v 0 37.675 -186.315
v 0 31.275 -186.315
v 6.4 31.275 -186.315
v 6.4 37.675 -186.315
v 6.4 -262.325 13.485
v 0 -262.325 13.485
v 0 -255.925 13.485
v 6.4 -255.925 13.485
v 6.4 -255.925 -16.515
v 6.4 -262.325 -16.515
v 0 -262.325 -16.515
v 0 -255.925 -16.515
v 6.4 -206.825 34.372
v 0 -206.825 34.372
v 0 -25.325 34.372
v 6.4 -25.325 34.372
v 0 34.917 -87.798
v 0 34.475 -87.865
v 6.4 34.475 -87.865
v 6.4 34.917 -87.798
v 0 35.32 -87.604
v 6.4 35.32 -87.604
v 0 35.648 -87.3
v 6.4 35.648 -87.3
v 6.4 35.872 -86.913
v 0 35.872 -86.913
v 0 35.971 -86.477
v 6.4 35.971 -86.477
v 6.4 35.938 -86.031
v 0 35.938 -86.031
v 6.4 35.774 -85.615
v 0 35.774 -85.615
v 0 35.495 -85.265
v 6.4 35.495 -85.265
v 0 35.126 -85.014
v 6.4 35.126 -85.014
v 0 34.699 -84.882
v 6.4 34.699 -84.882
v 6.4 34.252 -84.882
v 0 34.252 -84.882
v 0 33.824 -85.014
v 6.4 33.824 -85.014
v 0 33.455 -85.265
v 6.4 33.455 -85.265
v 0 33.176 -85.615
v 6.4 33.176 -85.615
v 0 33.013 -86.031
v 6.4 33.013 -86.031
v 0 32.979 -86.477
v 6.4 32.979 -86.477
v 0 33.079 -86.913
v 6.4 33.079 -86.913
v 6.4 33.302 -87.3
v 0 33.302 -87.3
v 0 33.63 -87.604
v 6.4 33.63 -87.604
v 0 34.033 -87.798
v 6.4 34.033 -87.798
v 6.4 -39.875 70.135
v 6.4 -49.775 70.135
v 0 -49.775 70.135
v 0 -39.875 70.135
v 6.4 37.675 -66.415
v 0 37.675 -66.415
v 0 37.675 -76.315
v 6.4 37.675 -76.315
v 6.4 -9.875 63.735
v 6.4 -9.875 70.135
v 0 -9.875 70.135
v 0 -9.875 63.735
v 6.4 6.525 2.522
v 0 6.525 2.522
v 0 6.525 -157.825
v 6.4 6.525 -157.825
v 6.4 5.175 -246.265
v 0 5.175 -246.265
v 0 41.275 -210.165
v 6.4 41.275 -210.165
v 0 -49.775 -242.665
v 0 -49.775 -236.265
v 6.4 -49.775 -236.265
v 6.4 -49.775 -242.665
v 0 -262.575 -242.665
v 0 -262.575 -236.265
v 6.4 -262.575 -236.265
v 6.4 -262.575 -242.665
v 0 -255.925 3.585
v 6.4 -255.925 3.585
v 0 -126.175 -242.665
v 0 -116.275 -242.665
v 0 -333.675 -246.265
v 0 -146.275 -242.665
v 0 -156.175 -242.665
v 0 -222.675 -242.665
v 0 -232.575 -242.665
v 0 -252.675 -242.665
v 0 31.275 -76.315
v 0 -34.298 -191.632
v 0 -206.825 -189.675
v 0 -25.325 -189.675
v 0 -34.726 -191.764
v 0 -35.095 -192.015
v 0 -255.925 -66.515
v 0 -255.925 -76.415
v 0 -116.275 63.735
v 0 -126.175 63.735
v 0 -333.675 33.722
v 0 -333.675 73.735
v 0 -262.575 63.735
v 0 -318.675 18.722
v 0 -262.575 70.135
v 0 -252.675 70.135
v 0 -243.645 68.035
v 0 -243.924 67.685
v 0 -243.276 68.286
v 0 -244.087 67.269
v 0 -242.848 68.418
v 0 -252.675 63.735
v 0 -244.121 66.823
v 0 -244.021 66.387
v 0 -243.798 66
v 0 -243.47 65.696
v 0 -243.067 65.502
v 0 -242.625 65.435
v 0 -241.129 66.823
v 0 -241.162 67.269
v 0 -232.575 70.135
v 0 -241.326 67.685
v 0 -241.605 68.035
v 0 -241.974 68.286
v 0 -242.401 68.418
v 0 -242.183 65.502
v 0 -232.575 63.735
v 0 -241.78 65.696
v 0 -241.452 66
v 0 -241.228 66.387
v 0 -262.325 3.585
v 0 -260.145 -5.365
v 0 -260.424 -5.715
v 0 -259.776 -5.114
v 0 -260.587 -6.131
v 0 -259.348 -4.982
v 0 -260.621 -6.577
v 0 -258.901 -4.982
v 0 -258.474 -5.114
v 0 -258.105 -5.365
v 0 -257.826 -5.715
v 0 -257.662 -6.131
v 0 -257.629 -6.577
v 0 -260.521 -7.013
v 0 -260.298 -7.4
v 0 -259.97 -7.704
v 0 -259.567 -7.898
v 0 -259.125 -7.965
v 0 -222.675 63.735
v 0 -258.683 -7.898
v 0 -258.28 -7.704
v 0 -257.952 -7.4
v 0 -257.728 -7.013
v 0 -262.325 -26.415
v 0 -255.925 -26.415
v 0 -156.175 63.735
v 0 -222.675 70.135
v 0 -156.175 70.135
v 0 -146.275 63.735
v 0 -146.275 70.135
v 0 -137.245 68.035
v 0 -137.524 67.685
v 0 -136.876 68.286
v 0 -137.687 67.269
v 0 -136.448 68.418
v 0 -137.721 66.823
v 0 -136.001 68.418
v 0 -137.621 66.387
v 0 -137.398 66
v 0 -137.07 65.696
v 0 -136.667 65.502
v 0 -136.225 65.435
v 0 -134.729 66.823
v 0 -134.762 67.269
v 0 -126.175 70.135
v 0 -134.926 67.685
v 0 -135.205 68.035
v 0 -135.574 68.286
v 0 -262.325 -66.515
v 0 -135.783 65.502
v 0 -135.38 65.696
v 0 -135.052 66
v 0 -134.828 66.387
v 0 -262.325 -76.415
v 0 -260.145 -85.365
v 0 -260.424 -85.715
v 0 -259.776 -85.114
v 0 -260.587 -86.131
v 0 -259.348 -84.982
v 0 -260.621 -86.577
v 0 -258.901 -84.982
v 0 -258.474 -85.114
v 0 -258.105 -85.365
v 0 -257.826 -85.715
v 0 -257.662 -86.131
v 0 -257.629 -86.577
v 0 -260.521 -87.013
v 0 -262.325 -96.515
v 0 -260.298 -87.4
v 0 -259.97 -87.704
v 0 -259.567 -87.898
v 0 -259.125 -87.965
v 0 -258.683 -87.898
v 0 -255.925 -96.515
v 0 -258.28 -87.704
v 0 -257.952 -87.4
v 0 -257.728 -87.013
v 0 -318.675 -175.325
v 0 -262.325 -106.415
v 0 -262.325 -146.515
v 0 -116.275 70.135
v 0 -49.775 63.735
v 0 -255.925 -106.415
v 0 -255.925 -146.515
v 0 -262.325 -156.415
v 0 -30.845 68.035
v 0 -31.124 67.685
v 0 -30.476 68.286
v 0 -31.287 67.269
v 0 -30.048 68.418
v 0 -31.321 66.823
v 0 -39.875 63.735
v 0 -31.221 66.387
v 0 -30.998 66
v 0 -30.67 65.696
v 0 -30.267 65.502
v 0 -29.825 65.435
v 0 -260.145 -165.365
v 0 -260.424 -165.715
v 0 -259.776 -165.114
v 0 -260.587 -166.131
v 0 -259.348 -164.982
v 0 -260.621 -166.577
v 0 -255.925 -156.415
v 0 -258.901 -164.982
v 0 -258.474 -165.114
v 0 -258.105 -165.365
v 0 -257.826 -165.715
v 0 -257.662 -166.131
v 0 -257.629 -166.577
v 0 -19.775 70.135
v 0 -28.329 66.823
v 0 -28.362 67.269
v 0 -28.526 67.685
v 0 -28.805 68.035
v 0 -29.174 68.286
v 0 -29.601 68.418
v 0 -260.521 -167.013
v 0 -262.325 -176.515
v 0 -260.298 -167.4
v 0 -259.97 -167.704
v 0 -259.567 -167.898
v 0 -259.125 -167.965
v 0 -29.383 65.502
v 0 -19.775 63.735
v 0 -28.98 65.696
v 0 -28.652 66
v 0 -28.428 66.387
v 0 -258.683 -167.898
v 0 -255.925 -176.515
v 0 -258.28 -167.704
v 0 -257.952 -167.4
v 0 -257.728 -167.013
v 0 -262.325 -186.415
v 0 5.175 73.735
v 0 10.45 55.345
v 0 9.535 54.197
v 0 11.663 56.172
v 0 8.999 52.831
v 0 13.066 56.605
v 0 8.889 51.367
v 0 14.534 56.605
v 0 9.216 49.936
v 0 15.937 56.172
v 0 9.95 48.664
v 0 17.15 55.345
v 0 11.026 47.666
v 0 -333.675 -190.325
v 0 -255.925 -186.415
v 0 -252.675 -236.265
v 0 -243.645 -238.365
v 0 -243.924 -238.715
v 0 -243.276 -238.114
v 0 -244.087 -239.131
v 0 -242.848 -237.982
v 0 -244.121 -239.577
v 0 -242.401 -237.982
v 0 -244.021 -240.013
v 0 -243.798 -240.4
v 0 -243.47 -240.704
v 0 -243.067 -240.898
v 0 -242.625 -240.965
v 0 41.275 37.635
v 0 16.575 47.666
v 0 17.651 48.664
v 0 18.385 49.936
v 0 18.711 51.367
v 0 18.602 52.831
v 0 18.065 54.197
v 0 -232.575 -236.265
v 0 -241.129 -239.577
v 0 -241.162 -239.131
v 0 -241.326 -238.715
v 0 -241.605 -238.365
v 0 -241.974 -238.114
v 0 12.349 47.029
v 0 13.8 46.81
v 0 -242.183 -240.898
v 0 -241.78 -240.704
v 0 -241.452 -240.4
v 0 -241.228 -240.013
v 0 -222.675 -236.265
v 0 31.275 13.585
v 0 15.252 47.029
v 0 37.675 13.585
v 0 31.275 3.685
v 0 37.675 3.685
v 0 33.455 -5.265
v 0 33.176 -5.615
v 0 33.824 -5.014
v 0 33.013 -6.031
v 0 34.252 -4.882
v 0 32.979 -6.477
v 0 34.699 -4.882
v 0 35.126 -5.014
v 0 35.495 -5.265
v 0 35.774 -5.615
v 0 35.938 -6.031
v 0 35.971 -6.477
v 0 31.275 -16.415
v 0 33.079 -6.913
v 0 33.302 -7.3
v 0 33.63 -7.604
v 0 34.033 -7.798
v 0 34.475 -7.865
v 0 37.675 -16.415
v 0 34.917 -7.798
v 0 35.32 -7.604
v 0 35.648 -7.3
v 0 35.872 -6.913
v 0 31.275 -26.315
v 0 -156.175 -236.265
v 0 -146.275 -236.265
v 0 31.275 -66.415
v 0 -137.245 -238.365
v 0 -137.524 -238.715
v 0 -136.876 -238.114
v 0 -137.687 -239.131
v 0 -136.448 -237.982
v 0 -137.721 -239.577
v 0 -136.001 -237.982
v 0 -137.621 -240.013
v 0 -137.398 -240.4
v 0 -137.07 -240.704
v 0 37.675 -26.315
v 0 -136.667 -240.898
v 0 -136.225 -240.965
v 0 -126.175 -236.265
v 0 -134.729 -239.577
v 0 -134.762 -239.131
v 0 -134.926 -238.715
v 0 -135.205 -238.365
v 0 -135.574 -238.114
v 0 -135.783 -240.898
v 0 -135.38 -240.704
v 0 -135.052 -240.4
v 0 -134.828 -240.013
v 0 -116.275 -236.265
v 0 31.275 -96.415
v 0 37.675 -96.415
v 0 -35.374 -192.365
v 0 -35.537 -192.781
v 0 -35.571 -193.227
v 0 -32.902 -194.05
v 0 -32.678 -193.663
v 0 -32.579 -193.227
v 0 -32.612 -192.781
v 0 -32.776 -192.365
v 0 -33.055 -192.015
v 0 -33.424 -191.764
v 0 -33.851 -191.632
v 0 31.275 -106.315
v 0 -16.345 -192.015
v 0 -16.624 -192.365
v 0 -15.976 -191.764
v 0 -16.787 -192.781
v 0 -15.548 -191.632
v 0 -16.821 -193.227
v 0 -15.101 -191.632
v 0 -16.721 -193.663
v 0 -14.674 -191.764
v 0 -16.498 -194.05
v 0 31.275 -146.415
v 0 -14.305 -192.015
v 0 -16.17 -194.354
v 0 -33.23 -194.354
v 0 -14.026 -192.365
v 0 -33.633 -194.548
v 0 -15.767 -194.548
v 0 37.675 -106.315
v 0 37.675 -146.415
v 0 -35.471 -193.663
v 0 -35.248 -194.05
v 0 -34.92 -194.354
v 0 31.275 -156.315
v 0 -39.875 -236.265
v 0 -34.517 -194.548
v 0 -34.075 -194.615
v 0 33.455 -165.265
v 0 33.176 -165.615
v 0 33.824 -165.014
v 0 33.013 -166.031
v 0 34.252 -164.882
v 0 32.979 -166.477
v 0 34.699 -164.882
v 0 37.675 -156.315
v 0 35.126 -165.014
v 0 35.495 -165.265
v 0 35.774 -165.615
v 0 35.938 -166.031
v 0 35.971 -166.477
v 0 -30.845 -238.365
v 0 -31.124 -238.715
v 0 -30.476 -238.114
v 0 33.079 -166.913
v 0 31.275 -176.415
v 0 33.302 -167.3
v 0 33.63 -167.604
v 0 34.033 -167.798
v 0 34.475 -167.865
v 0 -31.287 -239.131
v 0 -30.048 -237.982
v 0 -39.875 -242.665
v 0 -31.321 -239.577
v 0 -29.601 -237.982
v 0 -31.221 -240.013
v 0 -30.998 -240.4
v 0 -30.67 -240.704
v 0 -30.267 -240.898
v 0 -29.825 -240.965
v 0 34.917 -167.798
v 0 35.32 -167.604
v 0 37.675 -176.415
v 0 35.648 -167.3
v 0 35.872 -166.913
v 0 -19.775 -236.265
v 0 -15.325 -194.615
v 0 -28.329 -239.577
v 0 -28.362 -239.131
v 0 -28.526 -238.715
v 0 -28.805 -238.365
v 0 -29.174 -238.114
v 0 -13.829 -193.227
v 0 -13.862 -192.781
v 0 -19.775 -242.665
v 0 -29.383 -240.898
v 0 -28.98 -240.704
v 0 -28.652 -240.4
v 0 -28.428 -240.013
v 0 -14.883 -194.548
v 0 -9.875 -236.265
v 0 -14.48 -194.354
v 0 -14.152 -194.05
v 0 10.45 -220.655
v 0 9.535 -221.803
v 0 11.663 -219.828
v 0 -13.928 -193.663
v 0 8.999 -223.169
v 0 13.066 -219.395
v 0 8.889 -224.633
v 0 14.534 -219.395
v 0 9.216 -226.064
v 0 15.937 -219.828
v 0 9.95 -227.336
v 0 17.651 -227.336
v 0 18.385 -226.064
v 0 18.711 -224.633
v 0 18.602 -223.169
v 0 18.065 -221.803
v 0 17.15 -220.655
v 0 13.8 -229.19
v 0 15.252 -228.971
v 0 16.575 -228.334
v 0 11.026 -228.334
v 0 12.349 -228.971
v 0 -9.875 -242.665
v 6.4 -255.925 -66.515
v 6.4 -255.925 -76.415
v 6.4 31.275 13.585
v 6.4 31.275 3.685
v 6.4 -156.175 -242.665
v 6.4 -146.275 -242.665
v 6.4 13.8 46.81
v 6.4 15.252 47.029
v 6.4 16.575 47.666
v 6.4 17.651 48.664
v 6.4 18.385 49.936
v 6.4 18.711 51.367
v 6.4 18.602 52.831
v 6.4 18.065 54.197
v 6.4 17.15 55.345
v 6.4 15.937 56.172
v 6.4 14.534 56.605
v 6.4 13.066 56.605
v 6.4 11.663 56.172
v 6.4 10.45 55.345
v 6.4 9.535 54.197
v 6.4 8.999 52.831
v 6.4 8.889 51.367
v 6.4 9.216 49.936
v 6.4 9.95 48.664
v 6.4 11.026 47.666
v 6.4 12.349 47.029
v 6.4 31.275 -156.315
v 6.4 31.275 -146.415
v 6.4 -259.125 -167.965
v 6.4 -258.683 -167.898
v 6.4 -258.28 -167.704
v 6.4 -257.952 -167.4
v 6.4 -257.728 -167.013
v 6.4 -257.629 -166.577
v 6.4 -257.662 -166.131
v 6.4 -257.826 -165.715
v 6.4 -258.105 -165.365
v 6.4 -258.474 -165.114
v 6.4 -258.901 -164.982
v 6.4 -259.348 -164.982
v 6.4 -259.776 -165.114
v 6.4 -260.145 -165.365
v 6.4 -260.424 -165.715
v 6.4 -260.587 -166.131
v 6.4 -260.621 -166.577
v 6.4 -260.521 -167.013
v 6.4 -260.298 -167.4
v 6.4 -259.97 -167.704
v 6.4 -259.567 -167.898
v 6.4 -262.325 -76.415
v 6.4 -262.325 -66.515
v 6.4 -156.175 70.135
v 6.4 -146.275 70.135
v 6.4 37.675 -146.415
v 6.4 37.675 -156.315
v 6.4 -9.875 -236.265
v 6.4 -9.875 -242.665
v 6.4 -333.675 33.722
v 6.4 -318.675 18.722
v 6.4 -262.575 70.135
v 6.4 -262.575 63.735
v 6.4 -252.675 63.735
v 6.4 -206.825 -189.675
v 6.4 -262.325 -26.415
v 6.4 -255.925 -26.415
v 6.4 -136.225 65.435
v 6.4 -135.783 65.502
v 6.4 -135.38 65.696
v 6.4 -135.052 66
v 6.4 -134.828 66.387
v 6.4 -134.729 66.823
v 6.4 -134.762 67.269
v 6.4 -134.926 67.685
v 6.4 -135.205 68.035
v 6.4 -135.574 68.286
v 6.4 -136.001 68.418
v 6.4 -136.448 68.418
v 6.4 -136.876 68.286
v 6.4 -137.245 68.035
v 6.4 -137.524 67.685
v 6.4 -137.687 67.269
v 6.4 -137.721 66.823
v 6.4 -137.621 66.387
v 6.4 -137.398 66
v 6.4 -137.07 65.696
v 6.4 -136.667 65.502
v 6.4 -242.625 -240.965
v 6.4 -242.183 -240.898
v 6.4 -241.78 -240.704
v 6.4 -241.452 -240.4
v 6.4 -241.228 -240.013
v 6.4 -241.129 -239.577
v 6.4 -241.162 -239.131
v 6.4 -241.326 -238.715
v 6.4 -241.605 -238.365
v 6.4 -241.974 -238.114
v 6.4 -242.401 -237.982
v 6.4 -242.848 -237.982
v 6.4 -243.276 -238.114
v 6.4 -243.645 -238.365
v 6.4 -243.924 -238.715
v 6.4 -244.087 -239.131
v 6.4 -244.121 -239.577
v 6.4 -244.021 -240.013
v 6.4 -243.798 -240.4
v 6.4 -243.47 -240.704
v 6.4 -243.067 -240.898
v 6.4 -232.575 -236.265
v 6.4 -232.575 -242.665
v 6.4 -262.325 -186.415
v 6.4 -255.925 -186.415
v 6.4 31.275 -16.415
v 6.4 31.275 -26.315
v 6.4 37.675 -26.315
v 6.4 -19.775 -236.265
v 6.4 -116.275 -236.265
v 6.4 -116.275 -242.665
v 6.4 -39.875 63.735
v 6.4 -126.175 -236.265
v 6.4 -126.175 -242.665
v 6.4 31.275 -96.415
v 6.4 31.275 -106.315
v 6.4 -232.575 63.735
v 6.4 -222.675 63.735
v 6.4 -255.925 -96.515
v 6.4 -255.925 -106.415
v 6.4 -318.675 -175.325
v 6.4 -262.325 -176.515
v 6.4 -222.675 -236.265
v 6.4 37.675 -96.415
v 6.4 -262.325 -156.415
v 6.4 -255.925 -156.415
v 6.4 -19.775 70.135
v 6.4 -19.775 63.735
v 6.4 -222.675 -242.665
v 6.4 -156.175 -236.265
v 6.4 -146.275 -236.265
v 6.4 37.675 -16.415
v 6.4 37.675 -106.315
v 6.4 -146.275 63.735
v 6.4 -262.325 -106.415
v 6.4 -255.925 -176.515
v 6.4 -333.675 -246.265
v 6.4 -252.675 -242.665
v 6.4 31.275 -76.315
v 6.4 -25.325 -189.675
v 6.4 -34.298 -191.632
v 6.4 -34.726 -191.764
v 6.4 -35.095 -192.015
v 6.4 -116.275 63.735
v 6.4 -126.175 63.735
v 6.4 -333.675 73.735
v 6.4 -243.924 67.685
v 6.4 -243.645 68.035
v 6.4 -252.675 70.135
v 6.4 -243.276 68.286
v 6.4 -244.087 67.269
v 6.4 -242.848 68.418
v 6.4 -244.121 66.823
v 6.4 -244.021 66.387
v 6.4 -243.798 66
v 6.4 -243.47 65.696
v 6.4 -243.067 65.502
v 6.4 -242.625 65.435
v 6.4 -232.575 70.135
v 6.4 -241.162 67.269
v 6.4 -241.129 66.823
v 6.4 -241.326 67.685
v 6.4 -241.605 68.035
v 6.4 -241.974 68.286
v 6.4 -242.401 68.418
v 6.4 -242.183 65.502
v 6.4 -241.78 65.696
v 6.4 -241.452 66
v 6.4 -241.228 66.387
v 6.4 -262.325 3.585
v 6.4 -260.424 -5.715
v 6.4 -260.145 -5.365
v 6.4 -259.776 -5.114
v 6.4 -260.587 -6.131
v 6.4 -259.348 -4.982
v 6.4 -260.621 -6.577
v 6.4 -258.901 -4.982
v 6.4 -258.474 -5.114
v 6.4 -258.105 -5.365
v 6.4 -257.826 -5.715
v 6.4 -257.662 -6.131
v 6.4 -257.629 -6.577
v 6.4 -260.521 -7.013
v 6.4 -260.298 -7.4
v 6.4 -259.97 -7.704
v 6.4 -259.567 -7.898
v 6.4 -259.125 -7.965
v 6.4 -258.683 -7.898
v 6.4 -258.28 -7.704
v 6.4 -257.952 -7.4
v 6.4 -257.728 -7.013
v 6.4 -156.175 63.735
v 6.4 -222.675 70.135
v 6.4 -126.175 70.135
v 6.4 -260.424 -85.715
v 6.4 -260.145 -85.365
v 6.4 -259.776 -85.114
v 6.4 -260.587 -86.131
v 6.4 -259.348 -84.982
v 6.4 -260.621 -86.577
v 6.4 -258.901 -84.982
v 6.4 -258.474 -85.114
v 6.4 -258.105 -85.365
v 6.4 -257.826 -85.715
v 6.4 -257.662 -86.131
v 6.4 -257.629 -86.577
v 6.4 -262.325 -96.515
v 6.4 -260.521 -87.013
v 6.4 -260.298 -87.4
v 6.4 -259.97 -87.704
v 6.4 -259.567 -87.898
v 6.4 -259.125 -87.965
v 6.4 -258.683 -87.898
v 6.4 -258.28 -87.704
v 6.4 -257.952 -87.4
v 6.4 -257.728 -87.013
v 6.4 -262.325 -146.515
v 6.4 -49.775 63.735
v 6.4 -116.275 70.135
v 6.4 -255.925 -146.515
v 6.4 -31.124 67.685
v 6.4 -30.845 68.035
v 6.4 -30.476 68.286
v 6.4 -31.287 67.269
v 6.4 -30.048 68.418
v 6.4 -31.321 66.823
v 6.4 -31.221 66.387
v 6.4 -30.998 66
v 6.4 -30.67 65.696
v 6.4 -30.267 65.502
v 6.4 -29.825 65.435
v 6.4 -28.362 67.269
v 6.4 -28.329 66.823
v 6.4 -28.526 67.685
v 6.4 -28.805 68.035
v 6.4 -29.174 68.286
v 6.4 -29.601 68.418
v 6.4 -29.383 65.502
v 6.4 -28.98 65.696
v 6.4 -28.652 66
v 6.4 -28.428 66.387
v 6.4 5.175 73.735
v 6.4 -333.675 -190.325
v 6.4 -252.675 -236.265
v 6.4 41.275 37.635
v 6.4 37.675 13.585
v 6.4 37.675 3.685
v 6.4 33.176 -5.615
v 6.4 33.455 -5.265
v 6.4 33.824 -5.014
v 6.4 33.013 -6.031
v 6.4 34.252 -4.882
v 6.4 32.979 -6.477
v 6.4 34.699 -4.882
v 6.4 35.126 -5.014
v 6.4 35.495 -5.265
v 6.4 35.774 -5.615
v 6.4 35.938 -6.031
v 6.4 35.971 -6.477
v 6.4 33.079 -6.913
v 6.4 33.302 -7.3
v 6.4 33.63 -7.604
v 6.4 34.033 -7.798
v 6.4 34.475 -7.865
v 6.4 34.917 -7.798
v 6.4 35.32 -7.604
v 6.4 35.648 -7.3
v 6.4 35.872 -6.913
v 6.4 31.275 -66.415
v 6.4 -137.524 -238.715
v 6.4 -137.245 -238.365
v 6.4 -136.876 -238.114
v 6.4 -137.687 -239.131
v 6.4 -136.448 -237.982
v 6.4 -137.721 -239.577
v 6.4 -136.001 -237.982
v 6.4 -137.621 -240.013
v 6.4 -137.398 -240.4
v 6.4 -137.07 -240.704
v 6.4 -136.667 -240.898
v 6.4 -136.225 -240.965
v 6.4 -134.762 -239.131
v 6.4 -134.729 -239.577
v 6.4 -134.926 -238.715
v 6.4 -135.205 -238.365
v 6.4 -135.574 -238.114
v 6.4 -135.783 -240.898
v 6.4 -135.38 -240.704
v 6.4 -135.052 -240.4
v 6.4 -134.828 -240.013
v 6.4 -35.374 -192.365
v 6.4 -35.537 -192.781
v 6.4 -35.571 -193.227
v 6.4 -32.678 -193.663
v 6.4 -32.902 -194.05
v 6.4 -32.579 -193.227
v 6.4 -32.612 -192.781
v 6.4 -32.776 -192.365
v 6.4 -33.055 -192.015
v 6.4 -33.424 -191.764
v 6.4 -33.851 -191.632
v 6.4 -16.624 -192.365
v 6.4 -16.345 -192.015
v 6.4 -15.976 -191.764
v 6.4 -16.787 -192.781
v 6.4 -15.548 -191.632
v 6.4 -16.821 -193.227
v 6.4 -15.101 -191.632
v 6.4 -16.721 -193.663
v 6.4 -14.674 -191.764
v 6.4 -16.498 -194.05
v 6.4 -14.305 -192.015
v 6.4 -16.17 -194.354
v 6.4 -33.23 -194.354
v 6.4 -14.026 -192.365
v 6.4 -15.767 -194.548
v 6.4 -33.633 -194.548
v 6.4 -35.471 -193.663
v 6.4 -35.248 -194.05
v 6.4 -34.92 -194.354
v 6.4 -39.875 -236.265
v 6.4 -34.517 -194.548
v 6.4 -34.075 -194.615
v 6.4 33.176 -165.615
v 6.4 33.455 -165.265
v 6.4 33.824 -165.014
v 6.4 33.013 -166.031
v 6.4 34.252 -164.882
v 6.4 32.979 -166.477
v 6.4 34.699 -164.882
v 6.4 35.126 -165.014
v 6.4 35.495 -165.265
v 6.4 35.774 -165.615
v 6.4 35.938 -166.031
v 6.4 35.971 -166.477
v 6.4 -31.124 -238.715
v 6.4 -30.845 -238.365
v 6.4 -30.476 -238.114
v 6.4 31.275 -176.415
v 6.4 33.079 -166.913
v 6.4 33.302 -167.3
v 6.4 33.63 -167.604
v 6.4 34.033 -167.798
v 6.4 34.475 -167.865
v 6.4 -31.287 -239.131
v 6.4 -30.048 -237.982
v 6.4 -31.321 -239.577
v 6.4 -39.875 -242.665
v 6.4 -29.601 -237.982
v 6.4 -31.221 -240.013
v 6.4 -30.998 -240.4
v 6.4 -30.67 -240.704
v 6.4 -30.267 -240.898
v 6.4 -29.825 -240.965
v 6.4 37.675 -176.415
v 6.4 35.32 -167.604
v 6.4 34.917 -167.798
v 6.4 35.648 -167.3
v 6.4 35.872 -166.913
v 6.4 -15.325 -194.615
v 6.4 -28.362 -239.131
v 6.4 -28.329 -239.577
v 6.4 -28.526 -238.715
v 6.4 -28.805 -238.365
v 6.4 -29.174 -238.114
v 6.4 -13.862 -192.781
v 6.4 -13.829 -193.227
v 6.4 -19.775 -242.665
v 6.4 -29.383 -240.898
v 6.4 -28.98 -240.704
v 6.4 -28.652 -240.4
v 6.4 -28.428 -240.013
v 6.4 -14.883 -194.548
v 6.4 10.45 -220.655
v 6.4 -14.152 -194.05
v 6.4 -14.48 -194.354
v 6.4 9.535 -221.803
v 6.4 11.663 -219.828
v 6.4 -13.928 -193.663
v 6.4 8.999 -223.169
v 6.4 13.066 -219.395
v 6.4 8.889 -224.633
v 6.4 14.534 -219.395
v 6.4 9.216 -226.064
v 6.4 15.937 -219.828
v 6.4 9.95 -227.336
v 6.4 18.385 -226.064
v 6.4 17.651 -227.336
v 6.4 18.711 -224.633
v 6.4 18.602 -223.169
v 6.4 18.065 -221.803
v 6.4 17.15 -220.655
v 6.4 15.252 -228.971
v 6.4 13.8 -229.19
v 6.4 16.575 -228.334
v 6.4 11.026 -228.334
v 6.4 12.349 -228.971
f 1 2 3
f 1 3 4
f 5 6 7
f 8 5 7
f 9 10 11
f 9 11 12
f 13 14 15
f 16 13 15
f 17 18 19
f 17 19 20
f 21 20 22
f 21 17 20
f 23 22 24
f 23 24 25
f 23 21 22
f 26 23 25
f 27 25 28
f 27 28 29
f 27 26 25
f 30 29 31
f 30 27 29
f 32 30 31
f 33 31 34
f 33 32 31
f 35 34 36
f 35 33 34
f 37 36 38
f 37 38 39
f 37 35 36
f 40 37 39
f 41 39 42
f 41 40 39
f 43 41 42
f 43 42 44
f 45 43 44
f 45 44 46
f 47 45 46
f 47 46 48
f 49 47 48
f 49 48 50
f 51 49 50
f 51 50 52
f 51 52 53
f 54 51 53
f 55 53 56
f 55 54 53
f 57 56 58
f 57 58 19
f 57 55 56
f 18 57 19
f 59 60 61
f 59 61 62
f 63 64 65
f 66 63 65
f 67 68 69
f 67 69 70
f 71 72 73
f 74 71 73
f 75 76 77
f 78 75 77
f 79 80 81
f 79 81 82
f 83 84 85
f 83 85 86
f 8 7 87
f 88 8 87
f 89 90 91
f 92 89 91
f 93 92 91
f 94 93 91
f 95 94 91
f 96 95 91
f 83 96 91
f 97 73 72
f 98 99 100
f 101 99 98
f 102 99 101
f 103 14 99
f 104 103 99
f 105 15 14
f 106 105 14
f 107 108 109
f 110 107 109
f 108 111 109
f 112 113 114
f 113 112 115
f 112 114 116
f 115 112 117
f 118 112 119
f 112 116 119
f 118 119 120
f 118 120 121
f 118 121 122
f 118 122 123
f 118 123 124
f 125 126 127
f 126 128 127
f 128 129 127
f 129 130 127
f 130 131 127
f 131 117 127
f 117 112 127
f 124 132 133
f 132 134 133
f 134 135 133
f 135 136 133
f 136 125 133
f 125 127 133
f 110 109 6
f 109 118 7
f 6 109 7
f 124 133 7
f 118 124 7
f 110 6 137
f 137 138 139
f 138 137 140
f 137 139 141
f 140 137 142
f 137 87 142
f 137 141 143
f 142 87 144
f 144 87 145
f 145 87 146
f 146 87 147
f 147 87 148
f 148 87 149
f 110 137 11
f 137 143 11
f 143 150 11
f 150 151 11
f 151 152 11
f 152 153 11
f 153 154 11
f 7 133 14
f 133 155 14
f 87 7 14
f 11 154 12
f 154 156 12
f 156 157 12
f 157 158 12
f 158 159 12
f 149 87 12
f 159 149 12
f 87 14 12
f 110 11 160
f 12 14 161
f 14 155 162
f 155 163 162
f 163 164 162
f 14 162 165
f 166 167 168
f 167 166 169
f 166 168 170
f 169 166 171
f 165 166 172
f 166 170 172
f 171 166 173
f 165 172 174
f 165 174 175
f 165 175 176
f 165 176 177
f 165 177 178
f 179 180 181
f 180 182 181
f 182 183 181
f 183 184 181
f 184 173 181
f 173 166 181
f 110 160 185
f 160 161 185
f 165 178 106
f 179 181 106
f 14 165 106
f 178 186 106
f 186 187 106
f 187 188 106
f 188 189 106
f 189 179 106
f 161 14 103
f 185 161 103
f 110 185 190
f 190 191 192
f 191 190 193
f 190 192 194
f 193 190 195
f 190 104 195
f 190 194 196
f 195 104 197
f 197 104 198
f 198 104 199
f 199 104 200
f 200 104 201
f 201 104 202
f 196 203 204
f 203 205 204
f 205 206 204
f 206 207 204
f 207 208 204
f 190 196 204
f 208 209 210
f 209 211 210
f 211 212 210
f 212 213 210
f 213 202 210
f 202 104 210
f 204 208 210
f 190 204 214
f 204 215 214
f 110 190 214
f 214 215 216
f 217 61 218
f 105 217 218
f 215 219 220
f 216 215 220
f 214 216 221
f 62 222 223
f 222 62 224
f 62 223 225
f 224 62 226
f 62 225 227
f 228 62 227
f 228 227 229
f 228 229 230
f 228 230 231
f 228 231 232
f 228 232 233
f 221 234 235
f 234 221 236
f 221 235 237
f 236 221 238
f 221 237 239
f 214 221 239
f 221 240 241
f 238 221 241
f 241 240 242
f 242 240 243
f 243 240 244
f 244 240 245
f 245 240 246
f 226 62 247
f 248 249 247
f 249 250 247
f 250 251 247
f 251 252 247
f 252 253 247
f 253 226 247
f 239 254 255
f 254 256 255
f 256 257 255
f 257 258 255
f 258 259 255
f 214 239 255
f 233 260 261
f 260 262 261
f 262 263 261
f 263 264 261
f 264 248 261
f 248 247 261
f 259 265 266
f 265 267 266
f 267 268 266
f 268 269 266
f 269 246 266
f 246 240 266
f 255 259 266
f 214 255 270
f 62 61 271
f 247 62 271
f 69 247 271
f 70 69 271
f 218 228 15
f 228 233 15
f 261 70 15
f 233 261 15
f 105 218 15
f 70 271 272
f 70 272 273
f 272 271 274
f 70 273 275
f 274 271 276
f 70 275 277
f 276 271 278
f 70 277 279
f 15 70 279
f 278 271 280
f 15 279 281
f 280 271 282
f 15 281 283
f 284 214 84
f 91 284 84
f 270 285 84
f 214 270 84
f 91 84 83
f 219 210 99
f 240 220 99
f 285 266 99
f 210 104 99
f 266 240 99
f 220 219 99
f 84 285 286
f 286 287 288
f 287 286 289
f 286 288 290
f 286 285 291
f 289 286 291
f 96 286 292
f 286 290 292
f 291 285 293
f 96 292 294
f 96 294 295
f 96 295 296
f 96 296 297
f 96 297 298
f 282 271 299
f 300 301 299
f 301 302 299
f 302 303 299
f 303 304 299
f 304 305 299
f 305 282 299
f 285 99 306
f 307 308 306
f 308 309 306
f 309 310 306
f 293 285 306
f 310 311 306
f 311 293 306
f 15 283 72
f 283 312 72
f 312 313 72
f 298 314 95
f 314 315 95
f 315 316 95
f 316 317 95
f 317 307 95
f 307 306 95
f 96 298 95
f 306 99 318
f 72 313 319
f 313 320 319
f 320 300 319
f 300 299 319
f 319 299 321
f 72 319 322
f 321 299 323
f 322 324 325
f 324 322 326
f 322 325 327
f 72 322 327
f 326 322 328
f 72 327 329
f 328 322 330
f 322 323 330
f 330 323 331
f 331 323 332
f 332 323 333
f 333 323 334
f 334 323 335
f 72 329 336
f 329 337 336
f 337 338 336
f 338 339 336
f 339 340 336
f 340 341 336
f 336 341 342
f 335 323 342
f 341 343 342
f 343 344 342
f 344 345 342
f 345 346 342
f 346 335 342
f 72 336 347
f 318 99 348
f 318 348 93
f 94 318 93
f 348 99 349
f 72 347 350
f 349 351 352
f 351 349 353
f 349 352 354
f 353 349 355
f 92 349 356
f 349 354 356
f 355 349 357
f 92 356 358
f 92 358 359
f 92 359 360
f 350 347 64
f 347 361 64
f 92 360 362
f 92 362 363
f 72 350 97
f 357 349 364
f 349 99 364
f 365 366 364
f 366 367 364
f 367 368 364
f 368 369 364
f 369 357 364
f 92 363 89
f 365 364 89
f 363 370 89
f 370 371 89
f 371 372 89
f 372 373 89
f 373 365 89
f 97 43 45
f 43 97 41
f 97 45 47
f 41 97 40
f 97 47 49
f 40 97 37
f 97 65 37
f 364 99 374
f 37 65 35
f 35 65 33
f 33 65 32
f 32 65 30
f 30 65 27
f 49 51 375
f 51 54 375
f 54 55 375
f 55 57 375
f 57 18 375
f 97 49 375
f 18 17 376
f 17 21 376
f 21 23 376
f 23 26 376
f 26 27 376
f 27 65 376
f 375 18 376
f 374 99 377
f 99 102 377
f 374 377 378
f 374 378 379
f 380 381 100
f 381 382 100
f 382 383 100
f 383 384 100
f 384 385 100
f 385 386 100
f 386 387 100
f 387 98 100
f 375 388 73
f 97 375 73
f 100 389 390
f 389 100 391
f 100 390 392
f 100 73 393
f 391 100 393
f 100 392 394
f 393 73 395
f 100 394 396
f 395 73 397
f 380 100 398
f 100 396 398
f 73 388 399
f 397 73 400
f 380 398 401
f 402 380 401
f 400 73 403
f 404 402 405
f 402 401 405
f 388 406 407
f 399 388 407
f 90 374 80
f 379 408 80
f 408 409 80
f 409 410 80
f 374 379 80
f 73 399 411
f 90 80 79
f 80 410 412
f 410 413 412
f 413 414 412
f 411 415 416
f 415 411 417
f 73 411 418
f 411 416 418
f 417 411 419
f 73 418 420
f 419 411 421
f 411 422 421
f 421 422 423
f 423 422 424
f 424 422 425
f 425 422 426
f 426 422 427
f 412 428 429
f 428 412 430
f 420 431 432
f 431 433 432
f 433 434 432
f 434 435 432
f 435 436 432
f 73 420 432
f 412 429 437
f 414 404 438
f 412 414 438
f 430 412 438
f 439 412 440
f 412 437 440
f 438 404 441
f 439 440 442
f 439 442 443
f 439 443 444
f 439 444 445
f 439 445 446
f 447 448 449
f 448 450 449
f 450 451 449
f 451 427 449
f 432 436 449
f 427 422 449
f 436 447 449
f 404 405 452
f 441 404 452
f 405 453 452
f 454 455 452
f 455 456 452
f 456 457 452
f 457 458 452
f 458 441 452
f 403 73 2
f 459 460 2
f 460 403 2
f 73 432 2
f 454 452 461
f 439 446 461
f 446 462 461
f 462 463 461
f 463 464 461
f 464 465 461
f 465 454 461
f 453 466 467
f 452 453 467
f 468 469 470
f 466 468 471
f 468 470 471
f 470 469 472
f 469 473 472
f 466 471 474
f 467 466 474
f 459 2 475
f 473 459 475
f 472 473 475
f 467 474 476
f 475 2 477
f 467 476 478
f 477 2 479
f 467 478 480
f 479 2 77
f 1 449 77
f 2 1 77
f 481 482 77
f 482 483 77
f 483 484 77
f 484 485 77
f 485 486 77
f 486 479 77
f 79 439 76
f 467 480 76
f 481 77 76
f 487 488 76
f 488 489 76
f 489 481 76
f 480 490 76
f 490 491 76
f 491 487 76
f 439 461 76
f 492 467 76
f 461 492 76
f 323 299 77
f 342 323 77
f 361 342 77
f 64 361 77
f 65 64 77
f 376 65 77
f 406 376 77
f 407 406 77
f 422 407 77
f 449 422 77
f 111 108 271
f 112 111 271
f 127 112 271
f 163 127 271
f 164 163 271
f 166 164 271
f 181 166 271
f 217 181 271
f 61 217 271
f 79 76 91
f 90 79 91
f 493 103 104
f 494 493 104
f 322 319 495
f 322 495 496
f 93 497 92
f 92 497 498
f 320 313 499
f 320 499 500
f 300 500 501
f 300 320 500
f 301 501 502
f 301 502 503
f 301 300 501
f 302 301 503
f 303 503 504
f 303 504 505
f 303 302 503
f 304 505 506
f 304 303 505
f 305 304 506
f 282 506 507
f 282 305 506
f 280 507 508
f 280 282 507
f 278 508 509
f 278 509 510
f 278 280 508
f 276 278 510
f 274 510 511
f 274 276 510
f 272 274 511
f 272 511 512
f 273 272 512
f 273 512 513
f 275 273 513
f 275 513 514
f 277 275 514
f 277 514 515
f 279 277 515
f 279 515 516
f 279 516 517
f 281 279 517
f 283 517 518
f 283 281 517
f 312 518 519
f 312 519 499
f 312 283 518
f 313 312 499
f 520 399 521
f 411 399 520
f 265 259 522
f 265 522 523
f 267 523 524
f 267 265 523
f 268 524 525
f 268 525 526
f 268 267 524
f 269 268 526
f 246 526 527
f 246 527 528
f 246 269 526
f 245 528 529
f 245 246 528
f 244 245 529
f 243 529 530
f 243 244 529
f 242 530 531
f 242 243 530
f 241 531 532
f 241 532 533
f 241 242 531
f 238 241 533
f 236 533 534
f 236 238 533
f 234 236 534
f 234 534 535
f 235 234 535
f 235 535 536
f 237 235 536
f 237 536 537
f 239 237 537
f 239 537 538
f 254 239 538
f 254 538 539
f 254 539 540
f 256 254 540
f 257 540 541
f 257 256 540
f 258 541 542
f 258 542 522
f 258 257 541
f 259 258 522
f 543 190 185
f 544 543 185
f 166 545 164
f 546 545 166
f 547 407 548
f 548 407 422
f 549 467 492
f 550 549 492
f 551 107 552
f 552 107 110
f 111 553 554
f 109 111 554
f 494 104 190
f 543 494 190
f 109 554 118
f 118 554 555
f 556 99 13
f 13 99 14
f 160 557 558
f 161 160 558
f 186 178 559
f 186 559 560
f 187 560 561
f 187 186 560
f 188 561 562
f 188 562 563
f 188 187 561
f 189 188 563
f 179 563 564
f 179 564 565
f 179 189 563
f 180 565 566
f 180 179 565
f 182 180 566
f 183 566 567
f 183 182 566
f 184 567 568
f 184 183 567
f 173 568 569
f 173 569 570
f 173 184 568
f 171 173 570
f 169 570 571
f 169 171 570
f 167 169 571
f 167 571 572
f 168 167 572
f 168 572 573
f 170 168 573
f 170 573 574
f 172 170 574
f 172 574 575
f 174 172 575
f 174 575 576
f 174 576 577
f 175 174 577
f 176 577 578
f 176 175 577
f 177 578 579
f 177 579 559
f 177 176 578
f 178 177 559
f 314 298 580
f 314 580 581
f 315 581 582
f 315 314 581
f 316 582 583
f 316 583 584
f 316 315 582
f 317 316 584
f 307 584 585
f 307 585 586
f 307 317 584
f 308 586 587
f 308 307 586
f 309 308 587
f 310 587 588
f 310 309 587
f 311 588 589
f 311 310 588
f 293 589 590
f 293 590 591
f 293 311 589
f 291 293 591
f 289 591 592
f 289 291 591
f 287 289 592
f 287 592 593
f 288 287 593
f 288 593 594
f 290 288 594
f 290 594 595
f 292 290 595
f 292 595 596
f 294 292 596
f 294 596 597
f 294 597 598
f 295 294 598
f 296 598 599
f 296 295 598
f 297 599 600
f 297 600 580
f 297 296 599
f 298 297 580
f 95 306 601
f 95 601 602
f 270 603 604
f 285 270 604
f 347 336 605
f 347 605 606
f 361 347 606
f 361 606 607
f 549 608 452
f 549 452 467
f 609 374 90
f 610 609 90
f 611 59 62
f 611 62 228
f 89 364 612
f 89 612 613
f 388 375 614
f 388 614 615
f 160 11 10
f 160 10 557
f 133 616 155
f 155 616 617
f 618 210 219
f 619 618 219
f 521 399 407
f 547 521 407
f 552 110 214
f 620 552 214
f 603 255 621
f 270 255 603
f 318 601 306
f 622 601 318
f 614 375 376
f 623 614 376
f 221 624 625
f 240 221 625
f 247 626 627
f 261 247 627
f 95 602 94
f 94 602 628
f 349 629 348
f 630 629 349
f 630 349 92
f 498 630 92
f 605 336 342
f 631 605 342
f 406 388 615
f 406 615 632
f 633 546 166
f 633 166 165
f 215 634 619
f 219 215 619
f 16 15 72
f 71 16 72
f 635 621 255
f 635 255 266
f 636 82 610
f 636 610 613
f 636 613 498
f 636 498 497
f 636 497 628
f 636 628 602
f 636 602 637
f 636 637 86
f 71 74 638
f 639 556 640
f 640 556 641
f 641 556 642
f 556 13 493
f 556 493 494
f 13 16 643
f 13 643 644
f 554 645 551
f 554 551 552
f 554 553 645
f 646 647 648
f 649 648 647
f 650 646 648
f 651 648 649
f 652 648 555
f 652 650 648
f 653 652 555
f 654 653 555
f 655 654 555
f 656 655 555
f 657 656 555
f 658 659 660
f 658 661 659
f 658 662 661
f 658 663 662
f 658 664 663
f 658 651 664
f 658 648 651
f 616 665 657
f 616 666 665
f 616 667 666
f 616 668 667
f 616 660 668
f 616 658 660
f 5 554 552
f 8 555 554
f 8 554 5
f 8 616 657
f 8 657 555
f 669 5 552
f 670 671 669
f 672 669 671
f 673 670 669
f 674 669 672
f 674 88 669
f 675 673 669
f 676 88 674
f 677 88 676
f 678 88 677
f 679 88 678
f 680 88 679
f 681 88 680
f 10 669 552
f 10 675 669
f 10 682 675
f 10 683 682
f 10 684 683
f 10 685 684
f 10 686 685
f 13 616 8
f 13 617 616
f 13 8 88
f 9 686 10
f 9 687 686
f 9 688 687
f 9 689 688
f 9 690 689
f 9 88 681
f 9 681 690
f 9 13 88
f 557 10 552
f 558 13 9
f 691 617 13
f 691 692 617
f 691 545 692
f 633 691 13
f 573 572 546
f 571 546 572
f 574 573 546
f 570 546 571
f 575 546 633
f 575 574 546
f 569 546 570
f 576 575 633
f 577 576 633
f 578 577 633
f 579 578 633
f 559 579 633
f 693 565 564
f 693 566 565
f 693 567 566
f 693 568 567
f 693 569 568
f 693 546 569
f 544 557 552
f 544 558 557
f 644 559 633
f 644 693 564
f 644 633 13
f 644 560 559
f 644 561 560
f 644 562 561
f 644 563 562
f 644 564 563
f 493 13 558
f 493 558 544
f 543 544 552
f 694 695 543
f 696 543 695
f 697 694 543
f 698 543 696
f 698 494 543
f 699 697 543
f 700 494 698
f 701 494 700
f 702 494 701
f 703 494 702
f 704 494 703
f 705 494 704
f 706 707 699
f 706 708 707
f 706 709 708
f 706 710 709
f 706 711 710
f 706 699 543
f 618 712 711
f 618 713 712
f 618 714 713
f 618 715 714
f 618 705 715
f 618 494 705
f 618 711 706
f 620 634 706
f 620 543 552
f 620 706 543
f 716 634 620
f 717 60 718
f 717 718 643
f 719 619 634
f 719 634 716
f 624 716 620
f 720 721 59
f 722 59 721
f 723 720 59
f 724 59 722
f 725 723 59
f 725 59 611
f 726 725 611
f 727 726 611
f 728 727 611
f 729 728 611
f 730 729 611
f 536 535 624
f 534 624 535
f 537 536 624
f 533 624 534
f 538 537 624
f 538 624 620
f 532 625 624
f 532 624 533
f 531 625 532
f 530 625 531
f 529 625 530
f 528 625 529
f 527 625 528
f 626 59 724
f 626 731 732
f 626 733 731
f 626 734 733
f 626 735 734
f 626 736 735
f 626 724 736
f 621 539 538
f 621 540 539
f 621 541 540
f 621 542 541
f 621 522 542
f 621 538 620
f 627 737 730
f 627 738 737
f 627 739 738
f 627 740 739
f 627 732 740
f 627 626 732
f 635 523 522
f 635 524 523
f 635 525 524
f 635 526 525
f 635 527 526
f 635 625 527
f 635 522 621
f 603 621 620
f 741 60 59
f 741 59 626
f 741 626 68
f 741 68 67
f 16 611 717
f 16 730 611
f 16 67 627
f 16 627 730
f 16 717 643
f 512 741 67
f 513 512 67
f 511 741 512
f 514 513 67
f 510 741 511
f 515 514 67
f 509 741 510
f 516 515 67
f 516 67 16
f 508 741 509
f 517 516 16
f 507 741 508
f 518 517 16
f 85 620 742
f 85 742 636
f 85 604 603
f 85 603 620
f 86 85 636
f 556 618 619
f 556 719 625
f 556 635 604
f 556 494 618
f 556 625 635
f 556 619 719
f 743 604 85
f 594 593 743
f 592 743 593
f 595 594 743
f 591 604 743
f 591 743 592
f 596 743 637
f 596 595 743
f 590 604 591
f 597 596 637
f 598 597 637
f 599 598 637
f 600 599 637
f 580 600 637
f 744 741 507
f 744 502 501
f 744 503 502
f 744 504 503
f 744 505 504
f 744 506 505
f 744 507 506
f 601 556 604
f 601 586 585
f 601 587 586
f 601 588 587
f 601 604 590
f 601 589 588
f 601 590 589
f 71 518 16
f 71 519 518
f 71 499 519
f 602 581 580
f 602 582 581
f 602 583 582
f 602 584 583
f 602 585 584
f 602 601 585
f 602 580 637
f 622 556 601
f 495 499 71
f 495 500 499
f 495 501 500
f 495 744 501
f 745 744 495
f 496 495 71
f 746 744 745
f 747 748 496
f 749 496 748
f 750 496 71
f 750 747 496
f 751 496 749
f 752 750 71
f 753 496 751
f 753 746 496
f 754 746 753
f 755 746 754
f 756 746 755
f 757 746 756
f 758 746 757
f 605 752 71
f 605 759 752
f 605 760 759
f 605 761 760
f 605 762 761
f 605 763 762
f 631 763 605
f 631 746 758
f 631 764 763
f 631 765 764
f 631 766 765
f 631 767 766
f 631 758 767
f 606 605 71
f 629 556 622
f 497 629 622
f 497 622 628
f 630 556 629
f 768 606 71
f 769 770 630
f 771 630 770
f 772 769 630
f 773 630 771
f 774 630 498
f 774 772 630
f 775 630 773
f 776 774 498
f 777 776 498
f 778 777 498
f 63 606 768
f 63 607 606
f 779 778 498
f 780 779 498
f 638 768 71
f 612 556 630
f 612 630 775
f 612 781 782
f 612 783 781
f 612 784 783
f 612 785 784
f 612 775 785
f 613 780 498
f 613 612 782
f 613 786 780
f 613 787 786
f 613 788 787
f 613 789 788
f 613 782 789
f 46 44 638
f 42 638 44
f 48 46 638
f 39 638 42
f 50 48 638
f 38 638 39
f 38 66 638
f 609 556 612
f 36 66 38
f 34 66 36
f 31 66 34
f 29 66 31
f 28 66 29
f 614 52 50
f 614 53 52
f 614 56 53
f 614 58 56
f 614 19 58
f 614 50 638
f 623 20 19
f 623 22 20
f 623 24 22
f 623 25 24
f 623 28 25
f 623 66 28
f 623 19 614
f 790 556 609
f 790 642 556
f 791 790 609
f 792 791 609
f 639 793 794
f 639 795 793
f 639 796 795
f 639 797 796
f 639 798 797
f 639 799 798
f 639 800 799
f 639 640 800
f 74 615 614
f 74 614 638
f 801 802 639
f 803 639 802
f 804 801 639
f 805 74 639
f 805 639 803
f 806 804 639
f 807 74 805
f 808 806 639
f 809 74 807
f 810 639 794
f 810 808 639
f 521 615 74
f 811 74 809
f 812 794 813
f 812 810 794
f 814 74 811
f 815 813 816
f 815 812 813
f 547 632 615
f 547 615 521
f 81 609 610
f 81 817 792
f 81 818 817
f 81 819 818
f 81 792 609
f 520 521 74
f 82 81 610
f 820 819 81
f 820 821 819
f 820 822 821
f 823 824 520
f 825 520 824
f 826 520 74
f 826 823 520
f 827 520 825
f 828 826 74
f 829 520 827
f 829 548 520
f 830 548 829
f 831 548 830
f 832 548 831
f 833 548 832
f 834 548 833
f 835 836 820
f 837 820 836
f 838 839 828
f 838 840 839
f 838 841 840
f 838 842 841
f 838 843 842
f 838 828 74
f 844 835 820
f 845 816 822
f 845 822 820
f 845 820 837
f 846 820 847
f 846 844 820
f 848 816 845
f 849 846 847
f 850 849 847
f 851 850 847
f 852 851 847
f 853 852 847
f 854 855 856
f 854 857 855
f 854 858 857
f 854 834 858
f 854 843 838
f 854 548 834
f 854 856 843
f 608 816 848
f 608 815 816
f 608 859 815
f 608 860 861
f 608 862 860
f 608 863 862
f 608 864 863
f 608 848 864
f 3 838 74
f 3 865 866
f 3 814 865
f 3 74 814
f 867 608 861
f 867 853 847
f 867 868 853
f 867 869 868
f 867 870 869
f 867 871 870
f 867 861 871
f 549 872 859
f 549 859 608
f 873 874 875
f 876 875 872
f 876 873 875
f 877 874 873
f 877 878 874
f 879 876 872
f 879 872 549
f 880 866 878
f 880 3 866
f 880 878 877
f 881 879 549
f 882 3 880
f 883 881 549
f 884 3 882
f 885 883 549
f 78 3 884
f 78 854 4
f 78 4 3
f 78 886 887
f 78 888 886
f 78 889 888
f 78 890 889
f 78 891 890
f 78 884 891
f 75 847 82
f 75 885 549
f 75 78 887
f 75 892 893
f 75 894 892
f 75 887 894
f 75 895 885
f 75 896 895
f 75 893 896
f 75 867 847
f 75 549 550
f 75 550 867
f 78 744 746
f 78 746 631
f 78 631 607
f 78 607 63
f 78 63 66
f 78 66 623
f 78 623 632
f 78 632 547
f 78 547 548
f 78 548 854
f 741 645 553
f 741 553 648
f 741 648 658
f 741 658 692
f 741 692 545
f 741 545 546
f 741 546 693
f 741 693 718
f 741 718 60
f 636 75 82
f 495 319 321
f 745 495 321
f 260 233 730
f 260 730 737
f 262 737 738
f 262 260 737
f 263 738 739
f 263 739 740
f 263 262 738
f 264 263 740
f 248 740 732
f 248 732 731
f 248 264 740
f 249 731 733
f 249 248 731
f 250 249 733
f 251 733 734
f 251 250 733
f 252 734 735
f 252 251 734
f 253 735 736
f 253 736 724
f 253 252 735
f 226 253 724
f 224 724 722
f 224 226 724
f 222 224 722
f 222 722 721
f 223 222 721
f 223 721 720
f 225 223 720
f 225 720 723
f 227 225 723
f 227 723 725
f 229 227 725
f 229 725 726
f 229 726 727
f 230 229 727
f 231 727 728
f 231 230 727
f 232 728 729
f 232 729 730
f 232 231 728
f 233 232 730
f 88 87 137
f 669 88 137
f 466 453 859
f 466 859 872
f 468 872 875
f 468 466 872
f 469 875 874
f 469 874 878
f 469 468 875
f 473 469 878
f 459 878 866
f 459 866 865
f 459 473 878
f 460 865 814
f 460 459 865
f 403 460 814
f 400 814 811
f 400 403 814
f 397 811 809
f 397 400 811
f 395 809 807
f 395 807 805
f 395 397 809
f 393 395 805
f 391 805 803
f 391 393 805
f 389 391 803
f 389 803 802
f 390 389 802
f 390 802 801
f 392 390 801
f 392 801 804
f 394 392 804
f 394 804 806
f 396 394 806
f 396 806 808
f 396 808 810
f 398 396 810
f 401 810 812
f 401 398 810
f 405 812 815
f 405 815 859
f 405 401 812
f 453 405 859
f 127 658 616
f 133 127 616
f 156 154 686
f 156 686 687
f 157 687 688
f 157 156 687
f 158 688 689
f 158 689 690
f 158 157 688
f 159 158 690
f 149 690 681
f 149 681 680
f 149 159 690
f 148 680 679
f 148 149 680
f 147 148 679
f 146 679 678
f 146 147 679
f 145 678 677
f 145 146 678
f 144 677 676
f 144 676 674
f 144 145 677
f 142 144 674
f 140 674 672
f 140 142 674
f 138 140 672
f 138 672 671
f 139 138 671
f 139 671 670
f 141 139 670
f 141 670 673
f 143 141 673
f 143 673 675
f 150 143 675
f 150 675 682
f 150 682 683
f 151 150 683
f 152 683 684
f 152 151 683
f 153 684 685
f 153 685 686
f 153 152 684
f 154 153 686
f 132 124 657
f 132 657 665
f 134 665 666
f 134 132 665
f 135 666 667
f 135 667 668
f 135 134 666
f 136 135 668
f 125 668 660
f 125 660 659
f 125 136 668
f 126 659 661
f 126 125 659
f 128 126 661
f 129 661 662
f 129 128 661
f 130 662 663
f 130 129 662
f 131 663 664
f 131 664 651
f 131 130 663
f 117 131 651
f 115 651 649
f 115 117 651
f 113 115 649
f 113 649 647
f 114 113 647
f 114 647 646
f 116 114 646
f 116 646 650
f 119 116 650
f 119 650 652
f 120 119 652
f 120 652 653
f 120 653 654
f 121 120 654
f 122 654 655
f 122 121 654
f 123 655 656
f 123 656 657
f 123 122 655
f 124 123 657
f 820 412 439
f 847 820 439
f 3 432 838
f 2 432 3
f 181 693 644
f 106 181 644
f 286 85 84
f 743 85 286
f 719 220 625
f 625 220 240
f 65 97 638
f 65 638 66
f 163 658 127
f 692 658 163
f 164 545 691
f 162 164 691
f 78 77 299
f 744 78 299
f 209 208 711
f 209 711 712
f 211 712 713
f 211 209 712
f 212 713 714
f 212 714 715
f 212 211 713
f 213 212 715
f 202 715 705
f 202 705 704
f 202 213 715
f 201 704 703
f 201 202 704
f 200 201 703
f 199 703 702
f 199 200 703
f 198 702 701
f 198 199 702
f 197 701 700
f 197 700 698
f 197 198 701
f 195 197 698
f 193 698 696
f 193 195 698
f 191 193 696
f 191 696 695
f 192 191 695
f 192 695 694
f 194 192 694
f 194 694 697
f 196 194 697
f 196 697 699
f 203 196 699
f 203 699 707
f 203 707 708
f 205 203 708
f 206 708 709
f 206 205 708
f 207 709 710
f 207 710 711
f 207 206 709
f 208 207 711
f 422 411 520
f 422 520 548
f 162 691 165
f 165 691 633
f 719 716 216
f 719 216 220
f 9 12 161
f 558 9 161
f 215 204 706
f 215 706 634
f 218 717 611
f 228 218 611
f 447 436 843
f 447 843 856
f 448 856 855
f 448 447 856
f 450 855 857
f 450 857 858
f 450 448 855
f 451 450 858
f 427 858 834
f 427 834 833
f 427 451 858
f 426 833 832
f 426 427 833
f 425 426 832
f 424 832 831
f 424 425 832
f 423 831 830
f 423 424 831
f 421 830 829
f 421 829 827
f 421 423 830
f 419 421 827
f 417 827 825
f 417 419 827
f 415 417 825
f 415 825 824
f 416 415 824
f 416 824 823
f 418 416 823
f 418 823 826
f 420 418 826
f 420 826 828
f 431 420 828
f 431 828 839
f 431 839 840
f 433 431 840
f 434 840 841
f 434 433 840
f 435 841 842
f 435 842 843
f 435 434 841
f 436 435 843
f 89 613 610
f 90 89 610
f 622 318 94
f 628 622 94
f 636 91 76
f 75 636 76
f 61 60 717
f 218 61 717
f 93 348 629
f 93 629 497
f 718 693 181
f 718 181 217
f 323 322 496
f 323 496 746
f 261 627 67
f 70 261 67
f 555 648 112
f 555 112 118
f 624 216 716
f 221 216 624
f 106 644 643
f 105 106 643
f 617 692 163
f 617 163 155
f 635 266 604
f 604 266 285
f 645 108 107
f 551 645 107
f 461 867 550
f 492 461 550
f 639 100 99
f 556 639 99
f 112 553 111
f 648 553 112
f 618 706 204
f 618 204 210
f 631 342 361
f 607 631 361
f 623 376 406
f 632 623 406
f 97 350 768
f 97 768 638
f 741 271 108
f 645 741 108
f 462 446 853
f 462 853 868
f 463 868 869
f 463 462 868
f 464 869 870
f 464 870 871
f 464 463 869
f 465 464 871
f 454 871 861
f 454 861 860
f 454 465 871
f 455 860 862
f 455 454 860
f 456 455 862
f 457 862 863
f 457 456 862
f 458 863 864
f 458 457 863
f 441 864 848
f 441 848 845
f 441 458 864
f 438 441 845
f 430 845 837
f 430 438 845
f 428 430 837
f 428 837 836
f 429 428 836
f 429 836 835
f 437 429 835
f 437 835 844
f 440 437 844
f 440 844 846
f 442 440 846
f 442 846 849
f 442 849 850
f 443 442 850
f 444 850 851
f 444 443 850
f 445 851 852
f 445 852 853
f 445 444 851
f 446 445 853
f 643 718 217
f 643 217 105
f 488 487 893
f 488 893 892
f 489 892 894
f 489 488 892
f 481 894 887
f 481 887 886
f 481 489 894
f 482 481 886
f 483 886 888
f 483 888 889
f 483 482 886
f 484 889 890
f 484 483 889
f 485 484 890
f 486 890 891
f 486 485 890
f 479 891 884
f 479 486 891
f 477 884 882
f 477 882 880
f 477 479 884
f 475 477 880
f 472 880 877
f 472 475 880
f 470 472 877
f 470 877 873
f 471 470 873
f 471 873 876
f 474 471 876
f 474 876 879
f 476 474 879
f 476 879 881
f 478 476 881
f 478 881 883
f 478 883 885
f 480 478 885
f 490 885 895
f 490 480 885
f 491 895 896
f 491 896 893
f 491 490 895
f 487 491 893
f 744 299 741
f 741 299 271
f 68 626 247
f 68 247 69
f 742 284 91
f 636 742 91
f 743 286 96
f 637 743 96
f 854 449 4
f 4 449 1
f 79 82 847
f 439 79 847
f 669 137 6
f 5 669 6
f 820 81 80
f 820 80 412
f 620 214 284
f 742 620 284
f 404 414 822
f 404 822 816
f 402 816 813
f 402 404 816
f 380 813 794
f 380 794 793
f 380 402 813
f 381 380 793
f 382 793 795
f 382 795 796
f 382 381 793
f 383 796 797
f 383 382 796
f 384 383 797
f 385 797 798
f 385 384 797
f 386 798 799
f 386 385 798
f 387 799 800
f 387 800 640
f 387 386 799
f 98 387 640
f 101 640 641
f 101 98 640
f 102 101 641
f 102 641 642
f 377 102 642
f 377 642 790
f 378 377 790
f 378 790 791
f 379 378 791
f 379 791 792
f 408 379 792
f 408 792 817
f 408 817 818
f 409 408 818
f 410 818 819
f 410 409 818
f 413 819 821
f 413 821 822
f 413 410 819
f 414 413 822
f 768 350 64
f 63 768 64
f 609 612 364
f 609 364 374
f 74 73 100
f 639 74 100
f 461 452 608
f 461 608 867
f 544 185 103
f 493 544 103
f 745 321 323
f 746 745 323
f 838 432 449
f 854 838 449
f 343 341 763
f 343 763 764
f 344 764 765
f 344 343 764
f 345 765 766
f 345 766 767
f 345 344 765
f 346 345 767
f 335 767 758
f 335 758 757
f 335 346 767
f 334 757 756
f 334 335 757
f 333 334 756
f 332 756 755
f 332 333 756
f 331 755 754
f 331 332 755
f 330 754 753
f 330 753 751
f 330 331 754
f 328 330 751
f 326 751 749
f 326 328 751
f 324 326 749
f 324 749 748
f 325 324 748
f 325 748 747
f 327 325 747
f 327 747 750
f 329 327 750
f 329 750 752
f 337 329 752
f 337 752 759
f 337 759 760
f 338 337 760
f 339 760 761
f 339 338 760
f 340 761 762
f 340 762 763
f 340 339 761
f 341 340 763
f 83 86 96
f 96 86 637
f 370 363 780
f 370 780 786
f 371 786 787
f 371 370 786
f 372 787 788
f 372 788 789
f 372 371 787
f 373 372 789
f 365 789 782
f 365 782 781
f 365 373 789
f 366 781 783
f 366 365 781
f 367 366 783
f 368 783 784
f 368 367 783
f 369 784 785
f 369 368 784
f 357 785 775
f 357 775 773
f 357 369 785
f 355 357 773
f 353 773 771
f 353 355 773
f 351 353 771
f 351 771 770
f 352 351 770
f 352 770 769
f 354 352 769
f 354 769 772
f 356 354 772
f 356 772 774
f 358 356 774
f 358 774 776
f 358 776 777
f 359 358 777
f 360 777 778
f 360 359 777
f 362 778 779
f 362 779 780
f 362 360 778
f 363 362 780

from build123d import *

# Parameters (mm, degrees)
SKETCH1_R           = 1.5
SKETCH1_R_2         = 4.925
SKETCH1_W           = 9.9
SKETCH1_H           = 6.4
SKETCH1_W_2         = 6.4
SKETCH1_H_2         = 9.4
BOSS_EXTRUDE1_DEPTH = 6.4
SKETCH2_R           = 1.5
SKETCH2_W           = 6.4
SKETCH2_H           = 9.9
CUT_EXTRUDE1_DEPTH  = 415.760486883


with BuildPart() as part:
    # Sketch1 → Boss-Extrude1 (new body)
    with BuildSketch(Plane(origin=(0, 0, 0), x_dir=(0, 0, -1), z_dir=(1, 0, 0))):
        Polygon((210.165001125, 41.275232149), (-37.634998875, 41.275232149), (-73.734998875, 5.175232149), (-73.734998875, -333.674767851), (-33.721689147, -333.674767851), (-18.721689147, -318.674767851), (175.325001125, -318.674767851), (190.325001125, -333.674767851), (246.265001125, -333.674767851), (246.265001125, 5.175232149), align=None)
        with Locations((6.365001125, 34.475232149)):
            Circle(SKETCH1_R, mode=Mode.SUBTRACT)
        with Locations((86.365001125, 34.475232149)):
            Circle(SKETCH1_R, mode=Mode.SUBTRACT)
        with Locations((166.365001125, 34.475232149)):
            Circle(SKETCH1_R, mode=Mode.SUBTRACT)
        with Locations((86.46500109, -259.124767851)):
            Circle(SKETCH1_R, mode=Mode.SUBTRACT)
        with Locations((166.465001125, -259.124767851)):
            Circle(SKETCH1_R, mode=Mode.SUBTRACT)
        with Locations((6.46500109, -259.124767851)):
            Circle(SKETCH1_R, mode=Mode.SUBTRACT)
        with Locations((239.465001125, -29.824767851)):
            Circle(SKETCH1_R, mode=Mode.SUBTRACT)
        with Locations((239.465001125, -136.224767851)):
            Circle(SKETCH1_R, mode=Mode.SUBTRACT)
        with Locations((239.465001125, -242.624767851)):
            Circle(SKETCH1_R, mode=Mode.SUBTRACT)
        with Locations((-66.934998875, -242.624767851)):
            Circle(SKETCH1_R, mode=Mode.SUBTRACT)
        with Locations((-66.934998875, -136.224767851)):
            Circle(SKETCH1_R, mode=Mode.SUBTRACT)
        with Locations((-66.934998875, -29.824767851)):
            Circle(SKETCH1_R, mode=Mode.SUBTRACT)
        with Locations((224.265001125, 13.800232149)):
            Circle(SKETCH1_R_2, mode=Mode.SUBTRACT)
        with Locations((-51.734998875, 13.800232149)):
            Circle(SKETCH1_R_2, mode=Mode.SUBTRACT)
        with Locations((193.115001125, -15.324767851)):
            Circle(SKETCH1_R, mode=Mode.SUBTRACT)
        with Locations((193.115001125, -34.074767851)):
            Circle(SKETCH1_R, mode=Mode.SUBTRACT)
        with Locations((151.365001054, 34.475232149)):
            Rectangle(SKETCH1_W, SKETCH1_H, mode=Mode.SUBTRACT)
        with Locations((181.365001197, 34.475232149)):
            Rectangle(SKETCH1_W, SKETCH1_H, mode=Mode.SUBTRACT)
        with Locations((71.365001054, 34.475232149)):
            Rectangle(SKETCH1_W, SKETCH1_H, mode=Mode.SUBTRACT)
        with Locations((101.365001197, 34.475232149)):
            Rectangle(SKETCH1_W, SKETCH1_H, mode=Mode.SUBTRACT)
        with Locations((21.465001197, -259.124767851)):
            Rectangle(SKETCH1_W, SKETCH1_H, mode=Mode.SUBTRACT)
        Polygon((157.825001125, 6.525232149), (189.675001125, -25.324767851), (189.675001125, -206.824767851), (-34.371689147, -206.824767851), (-34.371689147, -25.324767851), (-2.521689147, 6.525232149), align=None, mode=Mode.SUBTRACT)
        Polygon((-3.584998946, -255.924767851), (-3.584999089, -262.324767851), (-13.484999089, -262.324767851), (-13.484998946, -255.924767851), align=None, mode=Mode.SUBTRACT)
        with Locations((101.465001197, -259.124767851)):
            Rectangle(SKETCH1_W, SKETCH1_H, mode=Mode.SUBTRACT)
        with Locations((-8.634998946, 34.475232149)):
            Rectangle(SKETCH1_W, SKETCH1_H, mode=Mode.SUBTRACT)
        with Locations((21.365001197, 34.475232149)):
            Rectangle(SKETCH1_W, SKETCH1_H, mode=Mode.SUBTRACT)
        Polygon((76.415001054, -255.924767851), (76.415000911, -262.324767851), (66.515000911, -262.324767851), (66.515001054, -255.924767851), align=None, mode=Mode.SUBTRACT)
        with Locations((239.465001125, -44.824767851)):
            Rectangle(SKETCH1_W_2, SKETCH1_H_2, mode=Mode.SUBTRACT)
        with Locations((151.465001125, -259.124767851)):
            Rectangle(SKETCH1_W, SKETCH1_H, mode=Mode.SUBTRACT)
        with Locations((181.465001125, -259.124767851)):
            Rectangle(SKETCH1_W, SKETCH1_H, mode=Mode.SUBTRACT)
    extrude(amount=BOSS_EXTRUDE1_DEPTH)

    # Sketch2 → Cut-Extrude1 (cut, through all)
    with BuildSketch(Plane(origin=(6.4, 0, 0), x_dir=(0, 0, -1), z_dir=(1, 0, 0))):
        with Locations((-66.934998875, -242.624767851)):
            Circle(SKETCH2_R)
        with Locations((-66.934998875, -136.224767851)):
            Circle(SKETCH2_R)
        with Locations((-66.934998875, -29.824767851)):
            Circle(SKETCH2_R)
        with Locations((239.465001125, -136.224767851)):
            Circle(SKETCH2_R)
        with Locations((239.465001125, -242.624767851)):
            Circle(SKETCH2_R)
        with Locations((239.465001125, -29.824767851)):
            Circle(SKETCH2_R)
        with Locations((-66.934998875, -257.624767851)):
            Rectangle(SKETCH2_W, SKETCH2_H)
        with Locations((-66.934998875, -227.624767851)):
            Rectangle(SKETCH2_W, SKETCH2_H)
        with Locations((-66.934998875, -121.224767851)):
            Rectangle(SKETCH2_W, SKETCH2_H)
        with Locations((-66.934998875, -151.224767851)):
            Rectangle(SKETCH2_W, SKETCH2_H)
        with Locations((-66.934998875, -14.824767851)):
            Rectangle(SKETCH2_W, SKETCH2_H)
        with Locations((-66.934998875, -44.824767851)):
            Rectangle(SKETCH2_W, SKETCH2_H)
        with Locations((239.465001125, -121.224767851)):
            Rectangle(SKETCH2_W, SKETCH2_H)
        with Locations((239.465001125, -151.224767851)):
            Rectangle(SKETCH2_W, SKETCH2_H)
        with Locations((239.465001125, -227.624767851)):
            Rectangle(SKETCH2_W, SKETCH2_H)
        with Locations((239.465001125, -257.624767851)):
            Rectangle(SKETCH2_W, SKETCH2_H)
        with Locations((239.465001125, -14.824767851)):
            Rectangle(SKETCH2_W, SKETCH2_H)
        with Locations((239.465001125, -44.824767851)):
            Rectangle(SKETCH2_W, SKETCH2_H)
    extrude(amount=-CUT_EXTRUDE1_DEPTH, mode=Mode.SUBTRACT)


solid = part.part
